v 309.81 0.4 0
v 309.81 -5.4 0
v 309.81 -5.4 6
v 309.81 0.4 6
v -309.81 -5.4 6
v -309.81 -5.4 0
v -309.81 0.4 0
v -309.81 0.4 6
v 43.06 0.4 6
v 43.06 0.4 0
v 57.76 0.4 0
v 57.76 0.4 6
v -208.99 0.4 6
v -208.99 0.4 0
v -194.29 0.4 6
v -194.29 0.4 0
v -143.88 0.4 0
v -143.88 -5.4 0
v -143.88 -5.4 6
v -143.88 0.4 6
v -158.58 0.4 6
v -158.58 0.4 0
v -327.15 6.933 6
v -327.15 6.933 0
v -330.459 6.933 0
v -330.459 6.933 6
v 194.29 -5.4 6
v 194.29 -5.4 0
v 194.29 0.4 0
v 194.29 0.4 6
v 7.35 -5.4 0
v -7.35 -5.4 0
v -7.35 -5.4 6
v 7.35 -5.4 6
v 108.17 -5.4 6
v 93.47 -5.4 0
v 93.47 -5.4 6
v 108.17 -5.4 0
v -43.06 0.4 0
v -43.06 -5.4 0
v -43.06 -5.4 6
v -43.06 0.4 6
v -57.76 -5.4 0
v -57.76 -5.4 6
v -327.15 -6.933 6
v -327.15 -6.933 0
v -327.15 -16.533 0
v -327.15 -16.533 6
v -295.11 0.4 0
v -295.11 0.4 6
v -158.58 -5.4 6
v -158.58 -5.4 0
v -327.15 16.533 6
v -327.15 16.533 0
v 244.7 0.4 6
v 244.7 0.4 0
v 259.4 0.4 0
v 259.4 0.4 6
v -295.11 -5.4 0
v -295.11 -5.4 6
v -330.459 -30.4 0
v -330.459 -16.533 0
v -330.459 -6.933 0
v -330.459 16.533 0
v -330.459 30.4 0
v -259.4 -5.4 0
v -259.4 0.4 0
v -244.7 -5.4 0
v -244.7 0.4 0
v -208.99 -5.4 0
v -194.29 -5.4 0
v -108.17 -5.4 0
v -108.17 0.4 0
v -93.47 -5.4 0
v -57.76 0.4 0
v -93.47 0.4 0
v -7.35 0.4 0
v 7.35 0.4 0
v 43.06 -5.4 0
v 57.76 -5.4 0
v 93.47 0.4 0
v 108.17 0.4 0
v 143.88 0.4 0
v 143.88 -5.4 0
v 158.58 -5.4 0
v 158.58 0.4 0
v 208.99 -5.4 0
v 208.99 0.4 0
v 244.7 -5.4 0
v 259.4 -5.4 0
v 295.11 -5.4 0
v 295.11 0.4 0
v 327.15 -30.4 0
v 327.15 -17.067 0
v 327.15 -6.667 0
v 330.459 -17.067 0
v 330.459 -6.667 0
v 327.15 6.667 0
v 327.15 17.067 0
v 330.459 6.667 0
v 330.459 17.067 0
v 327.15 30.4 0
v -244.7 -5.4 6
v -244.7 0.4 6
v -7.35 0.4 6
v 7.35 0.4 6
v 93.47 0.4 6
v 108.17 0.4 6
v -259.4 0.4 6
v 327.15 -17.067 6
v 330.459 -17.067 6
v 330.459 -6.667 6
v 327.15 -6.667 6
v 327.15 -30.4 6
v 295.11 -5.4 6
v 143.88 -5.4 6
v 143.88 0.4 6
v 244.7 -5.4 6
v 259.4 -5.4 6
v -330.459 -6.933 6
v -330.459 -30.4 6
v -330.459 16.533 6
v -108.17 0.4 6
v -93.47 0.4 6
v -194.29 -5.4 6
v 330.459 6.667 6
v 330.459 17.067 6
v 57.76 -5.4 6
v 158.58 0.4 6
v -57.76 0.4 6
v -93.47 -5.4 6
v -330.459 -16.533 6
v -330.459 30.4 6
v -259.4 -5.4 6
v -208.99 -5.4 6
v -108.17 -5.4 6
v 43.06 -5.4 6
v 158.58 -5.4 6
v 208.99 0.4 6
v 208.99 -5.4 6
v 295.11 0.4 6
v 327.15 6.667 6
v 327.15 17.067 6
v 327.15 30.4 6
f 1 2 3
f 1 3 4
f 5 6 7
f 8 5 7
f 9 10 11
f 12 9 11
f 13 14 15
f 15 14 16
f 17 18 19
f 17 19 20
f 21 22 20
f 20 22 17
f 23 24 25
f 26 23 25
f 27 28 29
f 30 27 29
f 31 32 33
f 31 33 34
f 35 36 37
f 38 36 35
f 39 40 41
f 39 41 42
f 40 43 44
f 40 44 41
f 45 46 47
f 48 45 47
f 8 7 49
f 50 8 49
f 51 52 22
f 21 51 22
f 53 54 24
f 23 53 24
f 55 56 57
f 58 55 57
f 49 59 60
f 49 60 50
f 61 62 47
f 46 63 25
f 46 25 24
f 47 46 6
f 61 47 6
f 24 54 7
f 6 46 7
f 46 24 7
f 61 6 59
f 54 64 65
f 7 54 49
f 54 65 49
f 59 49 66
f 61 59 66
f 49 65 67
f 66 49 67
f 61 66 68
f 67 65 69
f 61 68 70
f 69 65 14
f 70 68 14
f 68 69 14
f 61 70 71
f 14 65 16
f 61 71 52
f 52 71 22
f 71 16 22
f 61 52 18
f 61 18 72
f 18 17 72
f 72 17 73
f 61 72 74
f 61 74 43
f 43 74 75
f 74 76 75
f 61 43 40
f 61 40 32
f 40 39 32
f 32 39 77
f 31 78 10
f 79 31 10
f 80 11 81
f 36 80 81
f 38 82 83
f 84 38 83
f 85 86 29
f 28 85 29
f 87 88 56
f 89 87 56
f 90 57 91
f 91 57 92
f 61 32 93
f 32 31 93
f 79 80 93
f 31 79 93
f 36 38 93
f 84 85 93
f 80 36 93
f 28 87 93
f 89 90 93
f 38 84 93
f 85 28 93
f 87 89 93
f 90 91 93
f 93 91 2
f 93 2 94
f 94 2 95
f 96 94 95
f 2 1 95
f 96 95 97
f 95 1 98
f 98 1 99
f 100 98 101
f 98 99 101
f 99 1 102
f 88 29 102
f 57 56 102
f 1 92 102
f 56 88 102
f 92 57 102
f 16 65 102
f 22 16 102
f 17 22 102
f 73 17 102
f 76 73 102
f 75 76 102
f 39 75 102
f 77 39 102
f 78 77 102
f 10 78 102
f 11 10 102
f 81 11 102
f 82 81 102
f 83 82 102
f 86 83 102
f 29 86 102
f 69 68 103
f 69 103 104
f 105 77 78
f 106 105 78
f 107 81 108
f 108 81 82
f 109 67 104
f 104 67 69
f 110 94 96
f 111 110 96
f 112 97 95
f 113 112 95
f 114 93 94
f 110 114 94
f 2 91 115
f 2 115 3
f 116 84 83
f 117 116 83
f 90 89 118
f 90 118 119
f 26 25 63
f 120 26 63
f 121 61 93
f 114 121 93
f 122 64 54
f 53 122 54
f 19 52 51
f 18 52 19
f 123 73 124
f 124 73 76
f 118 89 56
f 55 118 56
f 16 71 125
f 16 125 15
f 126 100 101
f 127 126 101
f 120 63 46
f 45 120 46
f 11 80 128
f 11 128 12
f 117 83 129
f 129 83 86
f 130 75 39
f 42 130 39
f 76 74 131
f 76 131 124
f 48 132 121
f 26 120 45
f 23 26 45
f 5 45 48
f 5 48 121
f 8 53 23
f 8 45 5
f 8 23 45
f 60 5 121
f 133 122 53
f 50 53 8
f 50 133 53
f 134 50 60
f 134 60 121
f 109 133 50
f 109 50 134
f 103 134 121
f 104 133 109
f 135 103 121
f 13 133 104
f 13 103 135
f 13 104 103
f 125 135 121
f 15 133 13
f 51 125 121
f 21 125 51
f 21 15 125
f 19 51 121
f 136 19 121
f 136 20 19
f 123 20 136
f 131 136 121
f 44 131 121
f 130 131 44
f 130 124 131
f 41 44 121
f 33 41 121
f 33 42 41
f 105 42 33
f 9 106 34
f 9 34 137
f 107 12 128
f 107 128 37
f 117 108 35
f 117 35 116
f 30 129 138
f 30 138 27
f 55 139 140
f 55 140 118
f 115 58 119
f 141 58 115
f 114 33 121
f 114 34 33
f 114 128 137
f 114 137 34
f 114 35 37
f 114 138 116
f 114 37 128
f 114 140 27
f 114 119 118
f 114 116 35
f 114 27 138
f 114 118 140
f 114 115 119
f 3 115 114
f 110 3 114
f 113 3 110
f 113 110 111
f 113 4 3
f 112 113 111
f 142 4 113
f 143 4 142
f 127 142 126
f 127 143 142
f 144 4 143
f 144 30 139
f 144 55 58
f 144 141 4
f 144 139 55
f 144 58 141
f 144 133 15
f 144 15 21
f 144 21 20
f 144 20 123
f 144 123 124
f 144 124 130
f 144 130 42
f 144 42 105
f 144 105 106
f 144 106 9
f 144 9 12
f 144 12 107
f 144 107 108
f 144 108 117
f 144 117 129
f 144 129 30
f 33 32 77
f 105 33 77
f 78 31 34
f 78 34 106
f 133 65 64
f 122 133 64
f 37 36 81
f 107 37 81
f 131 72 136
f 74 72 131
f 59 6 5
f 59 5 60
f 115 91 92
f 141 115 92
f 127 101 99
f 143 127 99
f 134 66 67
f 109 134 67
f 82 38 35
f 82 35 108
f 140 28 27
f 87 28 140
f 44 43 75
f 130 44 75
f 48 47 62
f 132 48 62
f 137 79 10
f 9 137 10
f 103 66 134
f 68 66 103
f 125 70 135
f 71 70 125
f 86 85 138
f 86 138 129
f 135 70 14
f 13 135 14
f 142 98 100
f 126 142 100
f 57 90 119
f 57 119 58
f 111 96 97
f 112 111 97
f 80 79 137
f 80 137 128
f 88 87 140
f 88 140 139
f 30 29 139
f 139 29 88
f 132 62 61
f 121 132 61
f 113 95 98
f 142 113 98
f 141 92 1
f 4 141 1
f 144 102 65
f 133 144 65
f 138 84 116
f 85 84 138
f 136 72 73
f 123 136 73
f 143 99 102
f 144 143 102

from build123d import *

# Parameters (mm, degrees)
SKETCH_1_W      = 14.7
SKETCH_1_H      = 5.8
EXTRUDE_1_DEPTH = 6


with BuildPart() as part:
    # Эскиз1 → Бобышка-Вытянуть1 (new body)
    with BuildSketch(Plane.XY):
        Polygon((-327.15, -30.4), (327.15, -30.4), (327.15, -17.066666667), (330.45862, -17.066666667), (330.45862, -6.666666667), (327.15, -6.666666667), (327.15, 6.666666667), (330.45862, 6.666666667), (330.45862, 17.066666667), (327.15, 17.066666667), (327.15, 30.4), (-327.15, 30.4), (-330.45862, 30.4), (-330.45862, 16.533333333), (-327.15, 16.533333333), (-327.15, 6.933333333), (-330.45862, 6.933333333), (-330.45862, -6.933333333), (-327.15, -6.933333333), (-327.15, -16.533333333), (-330.45862, -16.533333333), (-330.45862, -30.4), align=None)
        with Locations((-252.05, -2.5)):
            Rectangle(SKETCH_1_W, SKETCH_1_H, mode=Mode.SUBTRACT)
        with Locations((-302.46, -2.5)):
            Rectangle(SKETCH_1_W, SKETCH_1_H, mode=Mode.SUBTRACT)
        with Locations((-201.64, -2.5)):
            Rectangle(SKETCH_1_W, SKETCH_1_H, mode=Mode.SUBTRACT)
        with Locations((-151.23, -2.5)):
            Rectangle(SKETCH_1_W, SKETCH_1_H, mode=Mode.SUBTRACT)
        with Locations((-100.82, -2.5)):
            Rectangle(SKETCH_1_W, SKETCH_1_H, mode=Mode.SUBTRACT)
        with Locations((-50.41, -2.5)):
            Rectangle(SKETCH_1_W, SKETCH_1_H, mode=Mode.SUBTRACT)
        with Locations((0, -2.5)):
            Rectangle(SKETCH_1_W, SKETCH_1_H, mode=Mode.SUBTRACT)
        with Locations((50.41, -2.5)):
            Rectangle(SKETCH_1_W, SKETCH_1_H, mode=Mode.SUBTRACT)
        with Locations((100.82, -2.5)):
            Rectangle(SKETCH_1_W, SKETCH_1_H, mode=Mode.SUBTRACT)
        with Locations((151.23, -2.5)):
            Rectangle(SKETCH_1_W, SKETCH_1_H, mode=Mode.SUBTRACT)
        with Locations((201.64, -2.5)):
            Rectangle(SKETCH_1_W, SKETCH_1_H, mode=Mode.SUBTRACT)
        with Locations((252.05, -2.5)):
            Rectangle(SKETCH_1_W, SKETCH_1_H, mode=Mode.SUBTRACT)
        with Locations((302.46, -2.5)):
            Rectangle(SKETCH_1_W, SKETCH_1_H, mode=Mode.SUBTRACT)
    extrude(amount=EXTRUDE_1_DEPTH)


solid = part.part
